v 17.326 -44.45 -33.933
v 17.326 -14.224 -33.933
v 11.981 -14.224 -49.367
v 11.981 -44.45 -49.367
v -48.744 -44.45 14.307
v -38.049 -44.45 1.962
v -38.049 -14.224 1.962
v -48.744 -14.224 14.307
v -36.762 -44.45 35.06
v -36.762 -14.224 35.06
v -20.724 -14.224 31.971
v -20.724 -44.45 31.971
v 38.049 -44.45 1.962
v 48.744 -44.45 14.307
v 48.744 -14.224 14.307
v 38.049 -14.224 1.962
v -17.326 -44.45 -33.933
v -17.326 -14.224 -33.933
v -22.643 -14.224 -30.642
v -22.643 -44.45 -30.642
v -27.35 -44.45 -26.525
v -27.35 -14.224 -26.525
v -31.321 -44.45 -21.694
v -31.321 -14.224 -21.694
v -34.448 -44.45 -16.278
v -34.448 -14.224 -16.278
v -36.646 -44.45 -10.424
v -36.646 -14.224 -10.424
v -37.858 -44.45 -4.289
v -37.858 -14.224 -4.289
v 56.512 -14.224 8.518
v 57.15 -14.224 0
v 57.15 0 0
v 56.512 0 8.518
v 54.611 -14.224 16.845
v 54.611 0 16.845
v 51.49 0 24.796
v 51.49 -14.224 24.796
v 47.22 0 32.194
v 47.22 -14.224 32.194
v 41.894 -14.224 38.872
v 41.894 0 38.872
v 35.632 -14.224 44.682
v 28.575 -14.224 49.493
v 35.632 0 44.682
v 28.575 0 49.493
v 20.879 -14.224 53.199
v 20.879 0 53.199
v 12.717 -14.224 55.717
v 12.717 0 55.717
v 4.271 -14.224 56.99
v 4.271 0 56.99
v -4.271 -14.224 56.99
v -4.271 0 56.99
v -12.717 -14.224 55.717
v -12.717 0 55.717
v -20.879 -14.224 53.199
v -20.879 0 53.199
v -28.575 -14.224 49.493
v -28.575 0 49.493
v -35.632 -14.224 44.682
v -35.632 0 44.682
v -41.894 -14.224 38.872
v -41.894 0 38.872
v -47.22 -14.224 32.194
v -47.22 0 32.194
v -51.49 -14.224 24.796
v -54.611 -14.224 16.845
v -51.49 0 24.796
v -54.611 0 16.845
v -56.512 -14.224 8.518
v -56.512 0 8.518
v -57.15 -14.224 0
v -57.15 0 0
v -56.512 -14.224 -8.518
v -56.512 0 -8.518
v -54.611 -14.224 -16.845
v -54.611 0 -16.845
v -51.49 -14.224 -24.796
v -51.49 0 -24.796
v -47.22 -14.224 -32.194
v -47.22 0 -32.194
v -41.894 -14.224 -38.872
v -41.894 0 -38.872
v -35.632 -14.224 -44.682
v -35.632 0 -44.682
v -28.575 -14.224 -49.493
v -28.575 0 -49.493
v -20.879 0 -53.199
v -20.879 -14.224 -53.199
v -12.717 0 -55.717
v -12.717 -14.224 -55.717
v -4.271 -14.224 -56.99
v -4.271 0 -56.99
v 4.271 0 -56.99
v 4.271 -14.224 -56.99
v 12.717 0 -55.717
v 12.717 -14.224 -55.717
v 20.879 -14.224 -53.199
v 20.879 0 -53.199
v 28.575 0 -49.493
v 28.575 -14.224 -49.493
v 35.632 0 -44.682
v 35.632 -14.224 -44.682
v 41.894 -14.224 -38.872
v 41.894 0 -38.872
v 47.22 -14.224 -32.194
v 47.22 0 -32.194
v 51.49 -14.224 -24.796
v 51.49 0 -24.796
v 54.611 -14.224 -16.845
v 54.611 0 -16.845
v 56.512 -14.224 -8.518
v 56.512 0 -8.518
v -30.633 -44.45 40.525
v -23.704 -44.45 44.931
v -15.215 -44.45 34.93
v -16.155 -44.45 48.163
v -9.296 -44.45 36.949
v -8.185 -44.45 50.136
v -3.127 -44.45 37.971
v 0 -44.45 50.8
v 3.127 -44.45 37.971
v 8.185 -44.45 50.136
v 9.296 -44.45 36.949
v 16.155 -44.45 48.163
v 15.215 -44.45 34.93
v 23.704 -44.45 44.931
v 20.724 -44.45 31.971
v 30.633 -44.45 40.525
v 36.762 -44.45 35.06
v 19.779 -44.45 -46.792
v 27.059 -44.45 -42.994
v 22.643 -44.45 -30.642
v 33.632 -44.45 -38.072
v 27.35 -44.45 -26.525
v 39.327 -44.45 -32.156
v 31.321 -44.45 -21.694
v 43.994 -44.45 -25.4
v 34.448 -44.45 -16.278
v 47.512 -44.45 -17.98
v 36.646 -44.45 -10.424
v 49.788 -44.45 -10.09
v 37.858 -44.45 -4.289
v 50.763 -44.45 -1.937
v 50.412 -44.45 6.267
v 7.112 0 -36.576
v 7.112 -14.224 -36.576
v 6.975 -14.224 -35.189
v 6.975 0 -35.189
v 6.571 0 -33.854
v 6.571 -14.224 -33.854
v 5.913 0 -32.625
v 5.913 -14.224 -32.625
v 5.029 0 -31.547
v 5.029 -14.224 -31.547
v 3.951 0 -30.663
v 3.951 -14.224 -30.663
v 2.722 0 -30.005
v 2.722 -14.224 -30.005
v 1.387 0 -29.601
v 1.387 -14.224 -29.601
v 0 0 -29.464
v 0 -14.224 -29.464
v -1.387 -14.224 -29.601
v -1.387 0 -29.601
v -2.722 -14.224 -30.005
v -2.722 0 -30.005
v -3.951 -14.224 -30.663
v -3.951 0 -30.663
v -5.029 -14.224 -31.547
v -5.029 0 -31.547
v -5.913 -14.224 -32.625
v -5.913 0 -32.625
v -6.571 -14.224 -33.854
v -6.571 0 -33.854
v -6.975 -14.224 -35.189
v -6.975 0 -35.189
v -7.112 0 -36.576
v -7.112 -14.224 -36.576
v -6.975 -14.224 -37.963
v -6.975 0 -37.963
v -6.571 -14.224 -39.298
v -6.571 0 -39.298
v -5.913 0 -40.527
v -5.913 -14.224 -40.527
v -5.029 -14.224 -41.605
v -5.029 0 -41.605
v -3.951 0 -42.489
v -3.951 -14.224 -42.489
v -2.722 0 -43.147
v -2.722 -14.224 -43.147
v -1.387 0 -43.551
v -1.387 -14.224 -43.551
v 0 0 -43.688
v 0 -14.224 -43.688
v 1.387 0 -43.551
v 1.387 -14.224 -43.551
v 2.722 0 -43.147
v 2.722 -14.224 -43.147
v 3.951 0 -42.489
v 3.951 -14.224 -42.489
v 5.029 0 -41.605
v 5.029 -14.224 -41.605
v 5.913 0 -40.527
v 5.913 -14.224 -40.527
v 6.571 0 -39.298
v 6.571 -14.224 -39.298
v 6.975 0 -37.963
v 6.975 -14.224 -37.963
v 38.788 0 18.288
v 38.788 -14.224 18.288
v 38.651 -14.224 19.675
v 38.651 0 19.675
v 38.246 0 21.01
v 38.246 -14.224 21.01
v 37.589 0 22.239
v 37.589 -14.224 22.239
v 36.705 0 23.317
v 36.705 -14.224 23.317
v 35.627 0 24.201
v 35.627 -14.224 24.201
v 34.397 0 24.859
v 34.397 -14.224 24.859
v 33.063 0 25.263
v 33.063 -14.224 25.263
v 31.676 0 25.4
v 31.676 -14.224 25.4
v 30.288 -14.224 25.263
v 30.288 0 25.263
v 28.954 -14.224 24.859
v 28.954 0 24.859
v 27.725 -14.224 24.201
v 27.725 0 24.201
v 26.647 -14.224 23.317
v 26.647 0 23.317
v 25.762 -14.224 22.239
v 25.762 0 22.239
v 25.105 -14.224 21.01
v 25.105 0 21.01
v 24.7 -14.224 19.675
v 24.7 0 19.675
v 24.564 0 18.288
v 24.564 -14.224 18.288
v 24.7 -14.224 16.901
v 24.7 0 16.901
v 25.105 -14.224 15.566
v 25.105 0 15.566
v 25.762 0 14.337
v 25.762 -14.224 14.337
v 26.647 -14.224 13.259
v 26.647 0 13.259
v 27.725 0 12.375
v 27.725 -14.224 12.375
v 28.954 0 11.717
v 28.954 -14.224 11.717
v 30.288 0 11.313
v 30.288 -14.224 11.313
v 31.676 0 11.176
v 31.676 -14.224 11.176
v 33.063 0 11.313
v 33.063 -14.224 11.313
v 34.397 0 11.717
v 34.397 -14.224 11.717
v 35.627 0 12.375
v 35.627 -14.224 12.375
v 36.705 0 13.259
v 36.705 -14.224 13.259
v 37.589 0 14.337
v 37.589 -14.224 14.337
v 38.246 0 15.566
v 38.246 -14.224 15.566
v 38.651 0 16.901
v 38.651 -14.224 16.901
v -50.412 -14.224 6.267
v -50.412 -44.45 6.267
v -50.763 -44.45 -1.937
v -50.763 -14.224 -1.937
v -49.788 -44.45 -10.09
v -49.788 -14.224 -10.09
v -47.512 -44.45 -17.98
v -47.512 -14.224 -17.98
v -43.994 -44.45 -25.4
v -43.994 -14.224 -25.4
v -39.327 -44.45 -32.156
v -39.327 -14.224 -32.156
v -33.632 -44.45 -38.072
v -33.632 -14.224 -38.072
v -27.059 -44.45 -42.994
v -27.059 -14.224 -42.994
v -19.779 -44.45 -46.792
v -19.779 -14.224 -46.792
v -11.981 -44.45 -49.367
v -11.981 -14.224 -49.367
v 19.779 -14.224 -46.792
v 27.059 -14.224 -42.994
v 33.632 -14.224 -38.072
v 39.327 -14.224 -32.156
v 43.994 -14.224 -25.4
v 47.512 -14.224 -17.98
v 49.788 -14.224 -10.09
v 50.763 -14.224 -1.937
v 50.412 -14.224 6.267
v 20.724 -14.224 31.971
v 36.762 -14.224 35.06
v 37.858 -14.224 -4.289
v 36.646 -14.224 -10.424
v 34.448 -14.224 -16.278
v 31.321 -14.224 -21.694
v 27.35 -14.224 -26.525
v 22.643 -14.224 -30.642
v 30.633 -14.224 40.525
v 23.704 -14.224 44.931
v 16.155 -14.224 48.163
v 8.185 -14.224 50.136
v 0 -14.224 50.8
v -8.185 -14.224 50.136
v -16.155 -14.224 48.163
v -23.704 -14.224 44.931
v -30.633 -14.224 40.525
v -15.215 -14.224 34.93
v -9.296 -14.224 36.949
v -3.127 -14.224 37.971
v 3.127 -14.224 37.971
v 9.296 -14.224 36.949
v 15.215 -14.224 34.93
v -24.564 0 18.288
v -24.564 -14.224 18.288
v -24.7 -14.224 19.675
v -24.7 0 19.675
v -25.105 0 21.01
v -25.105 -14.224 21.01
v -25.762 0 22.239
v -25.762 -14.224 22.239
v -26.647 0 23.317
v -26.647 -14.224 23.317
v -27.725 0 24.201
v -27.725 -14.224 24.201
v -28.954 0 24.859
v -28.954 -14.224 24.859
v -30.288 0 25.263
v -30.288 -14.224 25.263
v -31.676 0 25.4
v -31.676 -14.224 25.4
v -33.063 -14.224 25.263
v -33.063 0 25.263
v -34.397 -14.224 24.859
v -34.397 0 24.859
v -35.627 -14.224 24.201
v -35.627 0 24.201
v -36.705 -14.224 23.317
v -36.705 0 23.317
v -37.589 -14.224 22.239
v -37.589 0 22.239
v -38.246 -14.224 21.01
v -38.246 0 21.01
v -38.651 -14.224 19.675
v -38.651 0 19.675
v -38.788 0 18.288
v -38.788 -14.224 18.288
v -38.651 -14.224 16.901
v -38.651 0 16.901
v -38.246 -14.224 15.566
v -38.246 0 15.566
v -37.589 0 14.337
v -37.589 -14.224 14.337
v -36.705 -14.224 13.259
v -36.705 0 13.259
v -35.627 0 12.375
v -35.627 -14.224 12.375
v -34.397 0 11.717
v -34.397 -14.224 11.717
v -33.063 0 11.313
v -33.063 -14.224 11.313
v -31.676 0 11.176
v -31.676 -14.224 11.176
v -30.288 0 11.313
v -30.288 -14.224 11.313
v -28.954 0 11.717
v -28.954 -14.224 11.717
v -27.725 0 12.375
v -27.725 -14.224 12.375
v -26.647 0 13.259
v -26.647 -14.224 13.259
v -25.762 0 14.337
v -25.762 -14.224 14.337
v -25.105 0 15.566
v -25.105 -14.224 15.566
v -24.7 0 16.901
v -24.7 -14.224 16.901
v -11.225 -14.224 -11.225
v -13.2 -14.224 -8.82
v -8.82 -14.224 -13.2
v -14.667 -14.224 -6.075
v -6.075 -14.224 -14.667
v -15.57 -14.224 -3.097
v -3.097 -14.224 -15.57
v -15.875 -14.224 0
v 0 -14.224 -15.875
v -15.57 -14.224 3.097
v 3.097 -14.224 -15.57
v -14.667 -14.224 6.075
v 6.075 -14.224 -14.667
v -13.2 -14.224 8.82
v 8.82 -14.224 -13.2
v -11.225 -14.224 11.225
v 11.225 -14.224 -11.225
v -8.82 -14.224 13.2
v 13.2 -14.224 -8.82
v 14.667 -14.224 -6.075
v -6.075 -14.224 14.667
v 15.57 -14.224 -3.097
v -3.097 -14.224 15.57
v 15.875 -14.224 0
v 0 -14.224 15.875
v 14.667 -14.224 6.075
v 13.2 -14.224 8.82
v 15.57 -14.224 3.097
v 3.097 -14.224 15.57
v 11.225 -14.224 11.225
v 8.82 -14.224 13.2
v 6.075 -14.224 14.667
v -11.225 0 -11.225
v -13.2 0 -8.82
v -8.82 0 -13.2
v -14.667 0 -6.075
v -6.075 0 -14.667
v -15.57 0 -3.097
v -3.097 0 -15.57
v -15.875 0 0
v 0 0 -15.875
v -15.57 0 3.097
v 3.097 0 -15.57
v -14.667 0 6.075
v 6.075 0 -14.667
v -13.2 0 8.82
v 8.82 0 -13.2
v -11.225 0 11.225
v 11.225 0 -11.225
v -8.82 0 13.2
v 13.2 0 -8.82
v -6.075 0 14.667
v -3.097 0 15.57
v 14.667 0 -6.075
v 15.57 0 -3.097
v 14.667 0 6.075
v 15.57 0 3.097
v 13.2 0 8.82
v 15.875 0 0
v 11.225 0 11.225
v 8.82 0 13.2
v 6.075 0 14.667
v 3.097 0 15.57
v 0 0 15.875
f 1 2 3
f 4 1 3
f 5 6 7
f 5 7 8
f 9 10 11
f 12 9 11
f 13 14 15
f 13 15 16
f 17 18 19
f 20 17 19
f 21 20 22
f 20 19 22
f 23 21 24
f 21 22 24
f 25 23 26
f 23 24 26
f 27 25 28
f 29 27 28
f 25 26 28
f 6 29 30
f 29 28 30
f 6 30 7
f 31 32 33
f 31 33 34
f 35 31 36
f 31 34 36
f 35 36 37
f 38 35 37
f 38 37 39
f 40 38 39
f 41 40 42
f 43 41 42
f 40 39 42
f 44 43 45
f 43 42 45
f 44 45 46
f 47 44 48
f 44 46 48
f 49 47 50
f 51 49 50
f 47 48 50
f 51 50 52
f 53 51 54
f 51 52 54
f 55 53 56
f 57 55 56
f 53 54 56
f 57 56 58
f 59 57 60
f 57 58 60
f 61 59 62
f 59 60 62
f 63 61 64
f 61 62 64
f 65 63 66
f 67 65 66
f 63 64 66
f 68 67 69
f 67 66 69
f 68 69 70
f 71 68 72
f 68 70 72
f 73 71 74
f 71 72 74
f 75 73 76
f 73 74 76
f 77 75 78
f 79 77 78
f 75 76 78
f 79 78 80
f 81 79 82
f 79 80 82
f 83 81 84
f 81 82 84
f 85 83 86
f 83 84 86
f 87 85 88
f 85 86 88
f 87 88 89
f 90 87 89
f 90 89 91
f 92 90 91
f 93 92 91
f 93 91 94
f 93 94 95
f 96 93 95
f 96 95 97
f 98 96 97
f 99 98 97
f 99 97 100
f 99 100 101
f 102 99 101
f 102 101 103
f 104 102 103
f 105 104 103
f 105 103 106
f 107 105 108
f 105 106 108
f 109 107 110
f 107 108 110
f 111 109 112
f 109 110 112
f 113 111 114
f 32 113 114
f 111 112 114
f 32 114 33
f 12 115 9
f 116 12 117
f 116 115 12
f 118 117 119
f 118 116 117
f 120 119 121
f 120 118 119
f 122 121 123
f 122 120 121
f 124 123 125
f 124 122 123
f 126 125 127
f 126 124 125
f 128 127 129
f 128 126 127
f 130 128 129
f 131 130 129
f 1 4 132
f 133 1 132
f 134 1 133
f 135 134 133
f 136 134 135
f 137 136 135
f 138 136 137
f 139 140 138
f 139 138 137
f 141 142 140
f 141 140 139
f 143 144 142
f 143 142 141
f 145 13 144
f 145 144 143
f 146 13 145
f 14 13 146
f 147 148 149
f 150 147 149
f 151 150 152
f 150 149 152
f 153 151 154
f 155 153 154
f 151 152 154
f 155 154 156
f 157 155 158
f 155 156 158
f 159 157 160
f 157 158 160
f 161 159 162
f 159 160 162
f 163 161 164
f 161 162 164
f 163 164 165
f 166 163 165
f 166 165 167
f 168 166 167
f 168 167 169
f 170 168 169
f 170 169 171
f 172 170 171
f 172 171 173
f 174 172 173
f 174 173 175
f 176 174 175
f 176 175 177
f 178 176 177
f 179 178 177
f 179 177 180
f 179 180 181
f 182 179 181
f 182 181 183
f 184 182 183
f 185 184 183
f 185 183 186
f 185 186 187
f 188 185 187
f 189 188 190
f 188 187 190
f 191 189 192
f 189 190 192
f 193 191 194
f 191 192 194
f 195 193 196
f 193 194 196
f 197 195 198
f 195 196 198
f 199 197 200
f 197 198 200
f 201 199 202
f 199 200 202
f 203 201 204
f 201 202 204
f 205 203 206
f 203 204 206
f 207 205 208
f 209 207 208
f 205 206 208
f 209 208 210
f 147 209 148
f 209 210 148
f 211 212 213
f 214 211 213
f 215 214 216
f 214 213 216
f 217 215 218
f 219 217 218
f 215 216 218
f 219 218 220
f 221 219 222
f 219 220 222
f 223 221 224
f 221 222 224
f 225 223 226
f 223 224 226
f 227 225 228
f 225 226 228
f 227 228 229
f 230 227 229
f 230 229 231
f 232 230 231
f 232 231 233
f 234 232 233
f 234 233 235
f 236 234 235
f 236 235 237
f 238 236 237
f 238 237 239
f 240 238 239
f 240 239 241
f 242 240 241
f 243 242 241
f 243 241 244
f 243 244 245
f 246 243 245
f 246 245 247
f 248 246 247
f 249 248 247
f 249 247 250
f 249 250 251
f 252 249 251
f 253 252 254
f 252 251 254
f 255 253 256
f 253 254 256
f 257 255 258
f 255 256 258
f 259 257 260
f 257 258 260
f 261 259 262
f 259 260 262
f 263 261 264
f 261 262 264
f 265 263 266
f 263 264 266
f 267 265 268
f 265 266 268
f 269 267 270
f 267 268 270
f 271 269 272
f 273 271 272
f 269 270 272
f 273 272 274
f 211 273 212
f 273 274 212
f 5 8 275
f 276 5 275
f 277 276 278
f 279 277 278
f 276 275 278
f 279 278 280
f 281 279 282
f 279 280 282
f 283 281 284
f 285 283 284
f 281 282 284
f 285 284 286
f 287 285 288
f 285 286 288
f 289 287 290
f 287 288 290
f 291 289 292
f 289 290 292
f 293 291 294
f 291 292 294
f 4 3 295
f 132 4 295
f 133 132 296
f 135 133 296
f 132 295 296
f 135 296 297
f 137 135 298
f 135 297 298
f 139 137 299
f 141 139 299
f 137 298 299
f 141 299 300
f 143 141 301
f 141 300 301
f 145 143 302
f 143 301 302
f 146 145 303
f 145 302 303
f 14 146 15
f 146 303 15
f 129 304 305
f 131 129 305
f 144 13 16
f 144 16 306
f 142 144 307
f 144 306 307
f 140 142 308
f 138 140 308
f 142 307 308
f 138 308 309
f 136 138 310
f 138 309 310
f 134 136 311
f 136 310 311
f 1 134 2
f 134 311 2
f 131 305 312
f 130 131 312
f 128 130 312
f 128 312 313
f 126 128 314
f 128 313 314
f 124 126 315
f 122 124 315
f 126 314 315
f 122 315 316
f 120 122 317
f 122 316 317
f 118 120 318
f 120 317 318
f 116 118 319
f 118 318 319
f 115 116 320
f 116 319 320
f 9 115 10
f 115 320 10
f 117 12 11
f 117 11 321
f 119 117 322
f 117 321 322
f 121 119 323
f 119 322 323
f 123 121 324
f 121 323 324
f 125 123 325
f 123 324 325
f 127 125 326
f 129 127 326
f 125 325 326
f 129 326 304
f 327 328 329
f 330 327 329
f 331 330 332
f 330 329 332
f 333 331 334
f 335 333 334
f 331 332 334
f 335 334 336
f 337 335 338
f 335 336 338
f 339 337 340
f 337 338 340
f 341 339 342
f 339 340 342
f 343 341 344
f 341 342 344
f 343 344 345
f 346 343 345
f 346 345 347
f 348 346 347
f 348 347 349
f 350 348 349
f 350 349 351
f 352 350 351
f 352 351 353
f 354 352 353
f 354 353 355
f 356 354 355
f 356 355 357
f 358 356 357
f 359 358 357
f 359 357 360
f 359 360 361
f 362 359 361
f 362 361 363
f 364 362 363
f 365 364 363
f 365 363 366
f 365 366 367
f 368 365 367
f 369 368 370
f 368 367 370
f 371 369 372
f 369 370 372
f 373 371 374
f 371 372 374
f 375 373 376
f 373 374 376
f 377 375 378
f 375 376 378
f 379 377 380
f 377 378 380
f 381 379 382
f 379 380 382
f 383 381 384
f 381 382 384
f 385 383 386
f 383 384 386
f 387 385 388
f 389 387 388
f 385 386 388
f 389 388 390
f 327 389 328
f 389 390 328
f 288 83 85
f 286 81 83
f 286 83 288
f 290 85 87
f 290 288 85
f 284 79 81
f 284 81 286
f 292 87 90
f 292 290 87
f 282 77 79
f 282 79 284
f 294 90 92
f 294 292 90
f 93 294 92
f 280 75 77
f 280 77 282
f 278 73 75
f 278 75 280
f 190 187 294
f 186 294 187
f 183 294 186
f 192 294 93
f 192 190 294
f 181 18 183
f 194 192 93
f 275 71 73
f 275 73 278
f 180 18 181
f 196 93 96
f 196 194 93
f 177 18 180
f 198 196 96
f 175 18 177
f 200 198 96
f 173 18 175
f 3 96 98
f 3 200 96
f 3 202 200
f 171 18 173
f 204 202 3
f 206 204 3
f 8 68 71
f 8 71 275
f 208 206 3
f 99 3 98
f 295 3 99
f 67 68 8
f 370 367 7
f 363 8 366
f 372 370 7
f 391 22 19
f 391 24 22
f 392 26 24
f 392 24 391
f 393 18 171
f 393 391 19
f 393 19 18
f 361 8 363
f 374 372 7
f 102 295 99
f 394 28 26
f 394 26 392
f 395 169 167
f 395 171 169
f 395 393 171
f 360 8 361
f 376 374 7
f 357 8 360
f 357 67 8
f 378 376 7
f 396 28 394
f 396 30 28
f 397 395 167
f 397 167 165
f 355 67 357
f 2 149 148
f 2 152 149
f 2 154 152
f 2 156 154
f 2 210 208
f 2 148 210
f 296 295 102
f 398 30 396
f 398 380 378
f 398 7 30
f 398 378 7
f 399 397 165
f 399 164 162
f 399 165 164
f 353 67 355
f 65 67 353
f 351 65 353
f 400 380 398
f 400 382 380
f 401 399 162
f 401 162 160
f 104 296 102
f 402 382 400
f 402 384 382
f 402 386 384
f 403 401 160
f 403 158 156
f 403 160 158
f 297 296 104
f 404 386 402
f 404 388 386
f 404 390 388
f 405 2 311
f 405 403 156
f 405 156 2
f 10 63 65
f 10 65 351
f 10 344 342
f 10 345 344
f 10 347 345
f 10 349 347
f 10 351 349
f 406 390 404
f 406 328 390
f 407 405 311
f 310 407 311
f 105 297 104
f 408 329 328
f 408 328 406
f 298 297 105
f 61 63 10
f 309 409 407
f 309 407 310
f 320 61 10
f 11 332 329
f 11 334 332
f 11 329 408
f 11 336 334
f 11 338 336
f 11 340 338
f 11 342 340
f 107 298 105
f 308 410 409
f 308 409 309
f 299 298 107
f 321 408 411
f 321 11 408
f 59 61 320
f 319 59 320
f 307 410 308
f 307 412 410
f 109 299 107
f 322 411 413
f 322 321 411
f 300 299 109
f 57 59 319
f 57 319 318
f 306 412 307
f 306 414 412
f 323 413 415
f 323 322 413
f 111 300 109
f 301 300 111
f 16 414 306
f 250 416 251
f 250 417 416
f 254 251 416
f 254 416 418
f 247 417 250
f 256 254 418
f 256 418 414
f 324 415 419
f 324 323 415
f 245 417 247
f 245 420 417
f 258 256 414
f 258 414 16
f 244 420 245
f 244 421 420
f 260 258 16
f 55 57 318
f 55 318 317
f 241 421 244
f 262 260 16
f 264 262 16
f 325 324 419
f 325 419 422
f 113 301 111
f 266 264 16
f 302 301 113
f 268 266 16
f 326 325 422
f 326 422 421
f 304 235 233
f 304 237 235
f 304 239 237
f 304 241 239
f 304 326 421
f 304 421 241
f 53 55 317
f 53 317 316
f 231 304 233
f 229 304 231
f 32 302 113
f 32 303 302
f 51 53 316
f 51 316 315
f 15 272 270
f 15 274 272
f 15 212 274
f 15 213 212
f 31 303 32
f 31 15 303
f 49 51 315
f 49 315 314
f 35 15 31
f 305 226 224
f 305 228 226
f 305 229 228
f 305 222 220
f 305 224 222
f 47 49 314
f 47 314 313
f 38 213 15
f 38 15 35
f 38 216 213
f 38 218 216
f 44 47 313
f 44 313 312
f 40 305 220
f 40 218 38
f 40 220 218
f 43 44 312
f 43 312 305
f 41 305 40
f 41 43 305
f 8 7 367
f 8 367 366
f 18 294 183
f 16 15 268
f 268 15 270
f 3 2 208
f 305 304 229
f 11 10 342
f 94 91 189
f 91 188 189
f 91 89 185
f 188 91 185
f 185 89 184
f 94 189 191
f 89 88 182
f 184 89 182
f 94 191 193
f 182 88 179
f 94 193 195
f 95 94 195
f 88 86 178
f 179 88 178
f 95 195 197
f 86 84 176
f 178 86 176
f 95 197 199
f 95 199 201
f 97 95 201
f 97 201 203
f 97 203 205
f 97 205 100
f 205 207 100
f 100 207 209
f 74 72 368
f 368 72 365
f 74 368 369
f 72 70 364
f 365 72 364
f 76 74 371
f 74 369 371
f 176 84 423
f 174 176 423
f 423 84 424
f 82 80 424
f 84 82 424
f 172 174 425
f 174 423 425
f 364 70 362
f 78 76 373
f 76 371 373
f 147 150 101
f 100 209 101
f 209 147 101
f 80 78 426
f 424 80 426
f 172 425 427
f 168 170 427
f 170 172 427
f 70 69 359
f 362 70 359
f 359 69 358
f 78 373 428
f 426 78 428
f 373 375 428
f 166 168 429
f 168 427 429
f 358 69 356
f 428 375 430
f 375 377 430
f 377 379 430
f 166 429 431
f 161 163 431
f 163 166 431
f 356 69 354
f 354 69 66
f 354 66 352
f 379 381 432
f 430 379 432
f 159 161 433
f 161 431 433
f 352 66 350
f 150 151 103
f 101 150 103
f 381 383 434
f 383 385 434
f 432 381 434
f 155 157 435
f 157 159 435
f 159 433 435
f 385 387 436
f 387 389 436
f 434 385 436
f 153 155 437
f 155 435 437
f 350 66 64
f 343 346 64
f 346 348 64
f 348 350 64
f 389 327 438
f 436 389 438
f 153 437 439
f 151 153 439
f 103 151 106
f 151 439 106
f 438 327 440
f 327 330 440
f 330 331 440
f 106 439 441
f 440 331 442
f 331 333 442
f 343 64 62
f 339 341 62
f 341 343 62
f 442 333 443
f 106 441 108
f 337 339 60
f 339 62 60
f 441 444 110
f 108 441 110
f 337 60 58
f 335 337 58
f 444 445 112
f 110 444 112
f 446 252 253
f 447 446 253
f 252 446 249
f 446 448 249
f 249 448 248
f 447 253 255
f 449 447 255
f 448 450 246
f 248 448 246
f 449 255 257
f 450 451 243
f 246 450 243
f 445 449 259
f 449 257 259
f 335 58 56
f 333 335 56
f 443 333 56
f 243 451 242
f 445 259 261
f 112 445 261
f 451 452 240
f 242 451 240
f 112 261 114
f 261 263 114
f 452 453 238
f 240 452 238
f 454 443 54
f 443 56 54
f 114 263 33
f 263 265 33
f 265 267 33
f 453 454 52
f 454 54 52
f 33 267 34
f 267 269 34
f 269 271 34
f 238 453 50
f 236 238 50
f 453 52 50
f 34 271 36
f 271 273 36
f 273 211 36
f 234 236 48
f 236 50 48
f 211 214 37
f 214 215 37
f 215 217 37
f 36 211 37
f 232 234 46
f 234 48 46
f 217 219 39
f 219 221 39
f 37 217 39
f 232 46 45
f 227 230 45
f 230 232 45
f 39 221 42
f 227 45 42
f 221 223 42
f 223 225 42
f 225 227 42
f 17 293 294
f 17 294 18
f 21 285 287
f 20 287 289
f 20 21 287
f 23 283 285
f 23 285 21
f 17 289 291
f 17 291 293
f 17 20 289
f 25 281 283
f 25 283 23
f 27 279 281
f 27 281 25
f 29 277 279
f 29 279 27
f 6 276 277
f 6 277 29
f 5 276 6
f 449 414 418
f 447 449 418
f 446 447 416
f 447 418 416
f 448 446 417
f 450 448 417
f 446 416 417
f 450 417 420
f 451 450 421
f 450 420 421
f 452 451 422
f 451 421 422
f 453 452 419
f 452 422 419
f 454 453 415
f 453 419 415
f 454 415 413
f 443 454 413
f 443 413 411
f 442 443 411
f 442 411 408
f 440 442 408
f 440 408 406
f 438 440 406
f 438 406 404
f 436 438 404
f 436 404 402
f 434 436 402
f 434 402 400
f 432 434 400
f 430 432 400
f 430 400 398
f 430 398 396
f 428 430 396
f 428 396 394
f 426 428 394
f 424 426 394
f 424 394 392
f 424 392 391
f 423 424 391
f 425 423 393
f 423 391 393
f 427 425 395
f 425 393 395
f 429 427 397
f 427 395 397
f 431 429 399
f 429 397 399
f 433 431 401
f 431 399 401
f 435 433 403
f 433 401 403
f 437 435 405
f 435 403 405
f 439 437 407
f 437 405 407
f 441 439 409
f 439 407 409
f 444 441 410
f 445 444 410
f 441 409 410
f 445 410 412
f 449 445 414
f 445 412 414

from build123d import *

# Parameters (mm, degrees)
F0_R     = 57.15
F1_DEPTH = 14.224
F2_R     = 7.112
F2_R_2   = 15.875
F3_DEPTH = 14.225
F5_DEPTH = 30.226


with BuildPart() as f1:
    # F0 (on Front) → F1 (new body)
    with BuildSketch(Plane.XZ):
        Circle(F0_R)
    extrude(amount=F1_DEPTH)

    # F2 (on face) → F3 (cut, through all)
    with BuildSketch(Plane.XZ.offset(14.224)):
        with Locations((0, -36.576)):
            Circle(F2_R)
        with Locations((31.675745, 18.288)):
            Circle(F2_R)
        with Locations((-31.675745, 18.288)):
            Circle(F2_R)
        Circle(F2_R_2)
    extrude(amount=-F3_DEPTH, mode=Mode.SUBTRACT)

    # F4 (on face) → F5 (join)
    with BuildSketch(Plane.XZ.offset(14.224)):
        with BuildLine():
            Line((20.723909, 31.970762), (36.762214, 35.059658))
            ThreePointArc((36.762214, 35.059658), (0, 50.8), (-36.762214, 35.059658))
            Line((-36.762214, 35.059658), (-20.723909, 31.970762))
            ThreePointArc((-20.723909, 31.970762), (0, 38.1), (20.723909, 31.970762))
        make_face()
        with BuildLine():
            Line((-38.049446, 1.962051), (-48.743661, 14.307182))
            ThreePointArc((-48.743661, 14.307182), (-43.994091, -25.4), (-11.981447, -49.36684))
            Line((-11.981447, -49.36684), (-17.325537, -33.932813))
            ThreePointArc((-17.325537, -33.932813), (-32.995568, -19.05), (-38.049446, 1.962051))
        make_face()
        with BuildLine():
            ThreePointArc((38.049446, 1.962051), (32.995568, -19.05), (17.325537, -33.932812))
            Line((17.325537, -33.932812), (11.981447, -49.36684))
            ThreePointArc((11.981447, -49.36684), (43.994091, -25.4), (48.743661, 14.307182))
            Line((48.743661, 14.307182), (38.049446, 1.962051))
        make_face()
    extrude(amount=F5_DEPTH)


solid = f1.part
